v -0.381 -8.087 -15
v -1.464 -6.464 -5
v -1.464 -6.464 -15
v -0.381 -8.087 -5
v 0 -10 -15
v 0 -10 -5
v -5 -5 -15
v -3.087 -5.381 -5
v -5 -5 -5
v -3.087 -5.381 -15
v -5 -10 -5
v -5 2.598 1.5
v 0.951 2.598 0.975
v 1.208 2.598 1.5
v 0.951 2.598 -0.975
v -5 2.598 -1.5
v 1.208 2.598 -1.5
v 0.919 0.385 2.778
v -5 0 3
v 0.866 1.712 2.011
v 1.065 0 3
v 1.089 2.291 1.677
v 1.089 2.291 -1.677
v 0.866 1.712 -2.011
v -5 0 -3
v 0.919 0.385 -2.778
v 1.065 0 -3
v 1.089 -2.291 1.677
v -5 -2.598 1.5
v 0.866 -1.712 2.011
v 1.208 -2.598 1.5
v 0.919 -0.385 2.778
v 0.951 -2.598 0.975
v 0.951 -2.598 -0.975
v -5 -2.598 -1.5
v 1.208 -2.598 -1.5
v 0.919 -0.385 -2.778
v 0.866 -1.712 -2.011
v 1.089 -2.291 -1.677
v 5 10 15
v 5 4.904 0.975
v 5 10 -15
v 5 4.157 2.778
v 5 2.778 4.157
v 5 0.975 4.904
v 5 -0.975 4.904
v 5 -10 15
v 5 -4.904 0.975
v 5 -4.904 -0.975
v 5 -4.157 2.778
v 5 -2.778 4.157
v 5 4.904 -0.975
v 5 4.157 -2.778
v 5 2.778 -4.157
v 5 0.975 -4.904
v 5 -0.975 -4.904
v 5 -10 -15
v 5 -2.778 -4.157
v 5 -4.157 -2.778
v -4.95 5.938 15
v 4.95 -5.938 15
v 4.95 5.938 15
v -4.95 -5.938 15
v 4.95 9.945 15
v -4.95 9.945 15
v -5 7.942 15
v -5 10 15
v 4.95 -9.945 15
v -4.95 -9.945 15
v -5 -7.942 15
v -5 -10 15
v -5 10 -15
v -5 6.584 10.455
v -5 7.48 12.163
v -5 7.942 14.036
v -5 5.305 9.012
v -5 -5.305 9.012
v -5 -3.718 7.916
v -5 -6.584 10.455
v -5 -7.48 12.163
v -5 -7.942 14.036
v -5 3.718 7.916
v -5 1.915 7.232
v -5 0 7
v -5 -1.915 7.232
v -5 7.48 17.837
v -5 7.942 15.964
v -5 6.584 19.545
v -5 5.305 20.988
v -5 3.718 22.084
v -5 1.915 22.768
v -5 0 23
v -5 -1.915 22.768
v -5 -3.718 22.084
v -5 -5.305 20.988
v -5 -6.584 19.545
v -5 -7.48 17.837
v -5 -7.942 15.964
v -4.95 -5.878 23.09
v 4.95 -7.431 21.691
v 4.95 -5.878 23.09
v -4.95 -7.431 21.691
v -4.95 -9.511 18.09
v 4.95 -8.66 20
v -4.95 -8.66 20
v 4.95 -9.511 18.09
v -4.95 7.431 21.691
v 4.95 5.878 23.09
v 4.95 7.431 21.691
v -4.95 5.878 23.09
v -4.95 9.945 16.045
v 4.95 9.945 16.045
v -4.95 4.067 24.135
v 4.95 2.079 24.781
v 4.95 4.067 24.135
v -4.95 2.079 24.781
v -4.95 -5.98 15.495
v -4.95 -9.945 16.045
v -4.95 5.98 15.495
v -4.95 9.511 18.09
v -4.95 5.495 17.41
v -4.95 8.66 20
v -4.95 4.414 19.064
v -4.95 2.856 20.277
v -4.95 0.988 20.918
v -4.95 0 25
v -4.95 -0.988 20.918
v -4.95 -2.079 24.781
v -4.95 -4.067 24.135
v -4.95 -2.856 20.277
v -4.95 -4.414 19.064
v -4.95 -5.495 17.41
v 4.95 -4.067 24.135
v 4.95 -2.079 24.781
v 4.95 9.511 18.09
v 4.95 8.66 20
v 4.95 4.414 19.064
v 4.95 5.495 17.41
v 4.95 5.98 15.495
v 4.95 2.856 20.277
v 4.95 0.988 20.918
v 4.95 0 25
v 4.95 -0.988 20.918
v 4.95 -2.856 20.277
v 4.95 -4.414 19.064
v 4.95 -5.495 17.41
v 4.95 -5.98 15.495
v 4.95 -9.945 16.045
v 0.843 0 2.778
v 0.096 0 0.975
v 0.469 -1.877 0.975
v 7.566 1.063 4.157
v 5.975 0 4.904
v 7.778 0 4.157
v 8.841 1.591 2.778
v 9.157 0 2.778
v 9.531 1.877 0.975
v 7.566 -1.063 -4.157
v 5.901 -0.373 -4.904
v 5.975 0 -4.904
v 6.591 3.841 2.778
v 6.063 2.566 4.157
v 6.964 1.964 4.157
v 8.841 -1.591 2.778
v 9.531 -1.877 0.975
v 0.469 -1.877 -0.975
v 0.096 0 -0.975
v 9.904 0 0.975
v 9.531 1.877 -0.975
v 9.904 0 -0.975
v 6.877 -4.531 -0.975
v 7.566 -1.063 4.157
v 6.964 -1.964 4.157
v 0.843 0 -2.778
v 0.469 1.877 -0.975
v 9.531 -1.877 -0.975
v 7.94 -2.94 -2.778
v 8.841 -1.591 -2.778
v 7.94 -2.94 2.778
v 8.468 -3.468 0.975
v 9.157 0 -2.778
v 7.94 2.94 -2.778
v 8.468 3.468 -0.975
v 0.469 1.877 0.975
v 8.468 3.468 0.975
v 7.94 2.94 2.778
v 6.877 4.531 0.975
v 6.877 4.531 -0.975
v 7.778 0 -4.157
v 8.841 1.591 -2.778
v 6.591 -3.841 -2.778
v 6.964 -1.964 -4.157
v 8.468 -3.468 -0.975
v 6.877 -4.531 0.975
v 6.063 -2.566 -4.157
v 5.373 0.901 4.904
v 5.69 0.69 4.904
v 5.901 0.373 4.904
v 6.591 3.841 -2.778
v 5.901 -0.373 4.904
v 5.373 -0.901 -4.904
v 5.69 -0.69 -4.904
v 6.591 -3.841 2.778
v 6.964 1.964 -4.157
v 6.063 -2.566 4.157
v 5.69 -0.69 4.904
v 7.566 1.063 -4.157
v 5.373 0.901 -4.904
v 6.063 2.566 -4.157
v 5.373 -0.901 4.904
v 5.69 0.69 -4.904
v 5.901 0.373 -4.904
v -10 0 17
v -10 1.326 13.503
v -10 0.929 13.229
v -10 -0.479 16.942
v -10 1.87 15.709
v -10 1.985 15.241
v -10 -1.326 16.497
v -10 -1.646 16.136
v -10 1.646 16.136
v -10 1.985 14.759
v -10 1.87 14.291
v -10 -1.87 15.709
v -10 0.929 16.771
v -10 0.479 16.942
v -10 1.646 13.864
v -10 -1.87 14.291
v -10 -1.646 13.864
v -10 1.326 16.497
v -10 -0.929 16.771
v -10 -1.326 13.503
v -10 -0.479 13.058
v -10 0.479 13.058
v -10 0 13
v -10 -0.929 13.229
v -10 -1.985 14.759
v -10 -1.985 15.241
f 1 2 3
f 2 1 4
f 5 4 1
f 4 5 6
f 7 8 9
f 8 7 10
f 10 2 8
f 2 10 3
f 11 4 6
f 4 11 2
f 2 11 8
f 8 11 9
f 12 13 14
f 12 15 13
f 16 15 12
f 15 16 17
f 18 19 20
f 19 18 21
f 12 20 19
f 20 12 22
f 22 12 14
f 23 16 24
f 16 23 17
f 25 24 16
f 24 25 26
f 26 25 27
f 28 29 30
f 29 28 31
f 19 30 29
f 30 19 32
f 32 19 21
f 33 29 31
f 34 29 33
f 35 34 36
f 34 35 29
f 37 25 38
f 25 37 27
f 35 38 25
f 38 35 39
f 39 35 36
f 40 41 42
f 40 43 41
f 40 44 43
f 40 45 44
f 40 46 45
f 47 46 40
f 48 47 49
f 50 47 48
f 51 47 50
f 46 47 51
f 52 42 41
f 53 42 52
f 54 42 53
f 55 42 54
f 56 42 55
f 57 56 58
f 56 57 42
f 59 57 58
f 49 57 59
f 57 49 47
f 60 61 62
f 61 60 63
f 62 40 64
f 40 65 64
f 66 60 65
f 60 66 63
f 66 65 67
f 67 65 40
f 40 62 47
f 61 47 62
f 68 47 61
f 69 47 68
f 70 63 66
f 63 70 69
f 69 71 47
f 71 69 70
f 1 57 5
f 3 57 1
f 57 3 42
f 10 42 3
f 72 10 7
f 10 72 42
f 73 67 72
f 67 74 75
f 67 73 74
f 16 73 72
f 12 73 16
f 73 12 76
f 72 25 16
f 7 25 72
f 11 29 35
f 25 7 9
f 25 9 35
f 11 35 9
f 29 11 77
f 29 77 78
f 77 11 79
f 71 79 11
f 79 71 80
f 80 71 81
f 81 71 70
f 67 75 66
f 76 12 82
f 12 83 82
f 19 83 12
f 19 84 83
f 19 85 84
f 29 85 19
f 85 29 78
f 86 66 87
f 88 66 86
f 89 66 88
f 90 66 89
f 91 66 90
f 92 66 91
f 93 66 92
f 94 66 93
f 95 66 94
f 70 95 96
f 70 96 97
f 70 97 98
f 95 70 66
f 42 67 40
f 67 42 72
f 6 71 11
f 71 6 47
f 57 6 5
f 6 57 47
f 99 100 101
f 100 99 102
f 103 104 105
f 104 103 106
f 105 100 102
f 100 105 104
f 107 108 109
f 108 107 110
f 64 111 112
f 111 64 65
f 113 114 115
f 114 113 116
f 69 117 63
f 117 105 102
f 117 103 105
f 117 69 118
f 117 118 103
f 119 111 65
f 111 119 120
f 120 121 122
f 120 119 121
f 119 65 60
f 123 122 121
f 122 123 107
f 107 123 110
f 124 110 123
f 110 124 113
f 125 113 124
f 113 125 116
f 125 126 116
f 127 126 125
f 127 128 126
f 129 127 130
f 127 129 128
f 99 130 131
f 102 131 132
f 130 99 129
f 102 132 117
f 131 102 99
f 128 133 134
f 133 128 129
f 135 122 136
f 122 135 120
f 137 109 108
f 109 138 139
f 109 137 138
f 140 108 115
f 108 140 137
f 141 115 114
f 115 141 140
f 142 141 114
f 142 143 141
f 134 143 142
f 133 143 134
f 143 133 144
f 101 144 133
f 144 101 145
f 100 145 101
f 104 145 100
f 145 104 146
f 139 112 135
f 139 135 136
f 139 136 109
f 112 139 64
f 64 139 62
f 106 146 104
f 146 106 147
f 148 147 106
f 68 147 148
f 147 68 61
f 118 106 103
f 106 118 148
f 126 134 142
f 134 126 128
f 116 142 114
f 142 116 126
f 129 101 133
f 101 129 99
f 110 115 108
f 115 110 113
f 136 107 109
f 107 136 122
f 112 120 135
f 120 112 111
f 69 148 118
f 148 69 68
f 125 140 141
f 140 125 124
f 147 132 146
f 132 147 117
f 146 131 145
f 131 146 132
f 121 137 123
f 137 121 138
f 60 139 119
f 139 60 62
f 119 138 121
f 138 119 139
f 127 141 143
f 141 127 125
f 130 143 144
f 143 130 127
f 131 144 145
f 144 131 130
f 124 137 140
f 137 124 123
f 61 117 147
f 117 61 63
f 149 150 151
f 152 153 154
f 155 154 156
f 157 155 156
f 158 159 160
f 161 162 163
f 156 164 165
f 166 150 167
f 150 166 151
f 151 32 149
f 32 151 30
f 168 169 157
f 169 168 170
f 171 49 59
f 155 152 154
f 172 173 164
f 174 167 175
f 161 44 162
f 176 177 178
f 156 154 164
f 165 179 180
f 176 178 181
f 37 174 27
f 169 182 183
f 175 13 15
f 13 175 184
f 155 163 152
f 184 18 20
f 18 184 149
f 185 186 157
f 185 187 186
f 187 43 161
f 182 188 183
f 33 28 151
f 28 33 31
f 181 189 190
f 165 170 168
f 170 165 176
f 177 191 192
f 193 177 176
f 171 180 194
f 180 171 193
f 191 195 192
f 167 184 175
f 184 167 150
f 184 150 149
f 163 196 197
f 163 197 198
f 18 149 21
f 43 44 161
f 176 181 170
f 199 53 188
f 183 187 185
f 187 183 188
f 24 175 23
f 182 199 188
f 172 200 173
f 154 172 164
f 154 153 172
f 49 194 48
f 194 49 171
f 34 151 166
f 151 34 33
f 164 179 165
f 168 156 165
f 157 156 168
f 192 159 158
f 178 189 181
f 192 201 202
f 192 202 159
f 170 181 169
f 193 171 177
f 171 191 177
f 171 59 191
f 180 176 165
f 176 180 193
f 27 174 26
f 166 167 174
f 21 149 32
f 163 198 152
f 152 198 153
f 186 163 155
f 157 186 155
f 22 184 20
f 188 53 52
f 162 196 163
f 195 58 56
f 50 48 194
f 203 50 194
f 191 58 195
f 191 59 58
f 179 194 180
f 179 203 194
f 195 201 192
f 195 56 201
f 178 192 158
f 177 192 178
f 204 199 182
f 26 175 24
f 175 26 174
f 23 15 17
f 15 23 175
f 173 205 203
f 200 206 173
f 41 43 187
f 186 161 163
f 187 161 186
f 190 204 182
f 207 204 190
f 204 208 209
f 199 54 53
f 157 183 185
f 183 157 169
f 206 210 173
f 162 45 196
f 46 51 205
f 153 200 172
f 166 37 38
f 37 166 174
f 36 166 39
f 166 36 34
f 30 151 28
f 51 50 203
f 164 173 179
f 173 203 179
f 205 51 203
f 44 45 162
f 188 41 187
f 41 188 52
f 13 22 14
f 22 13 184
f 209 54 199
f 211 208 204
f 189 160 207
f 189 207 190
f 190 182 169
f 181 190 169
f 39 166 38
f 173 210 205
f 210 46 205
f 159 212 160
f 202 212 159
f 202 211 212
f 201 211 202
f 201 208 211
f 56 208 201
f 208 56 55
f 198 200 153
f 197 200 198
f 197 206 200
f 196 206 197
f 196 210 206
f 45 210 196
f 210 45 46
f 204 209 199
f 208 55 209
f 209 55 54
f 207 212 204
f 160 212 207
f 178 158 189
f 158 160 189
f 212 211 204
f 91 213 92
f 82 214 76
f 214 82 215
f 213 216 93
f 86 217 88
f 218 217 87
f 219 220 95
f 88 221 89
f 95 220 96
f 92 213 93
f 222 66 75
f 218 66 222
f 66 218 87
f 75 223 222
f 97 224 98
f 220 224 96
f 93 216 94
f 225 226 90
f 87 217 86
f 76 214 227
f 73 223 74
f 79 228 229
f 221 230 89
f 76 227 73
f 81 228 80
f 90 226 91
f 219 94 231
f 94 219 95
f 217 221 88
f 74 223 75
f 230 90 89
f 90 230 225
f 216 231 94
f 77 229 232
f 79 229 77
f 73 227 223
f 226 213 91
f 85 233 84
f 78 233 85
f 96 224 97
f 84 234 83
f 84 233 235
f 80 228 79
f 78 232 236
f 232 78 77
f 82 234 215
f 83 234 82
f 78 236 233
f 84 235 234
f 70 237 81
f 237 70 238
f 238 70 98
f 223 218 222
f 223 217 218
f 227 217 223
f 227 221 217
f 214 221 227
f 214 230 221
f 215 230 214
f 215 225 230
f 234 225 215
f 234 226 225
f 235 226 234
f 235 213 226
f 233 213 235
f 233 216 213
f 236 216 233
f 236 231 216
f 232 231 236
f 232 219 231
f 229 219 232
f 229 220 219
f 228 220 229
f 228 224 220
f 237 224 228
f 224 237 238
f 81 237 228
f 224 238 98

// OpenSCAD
use <povray.scad>

pov_init();
openscad_background();
openscad_camera(type="perspective", distance=300, width= 16, heigth= 9);
openscad_light_source();


_translate([-5,-10,-15]) 
_union()
{
  _color([1,0.5,0.5]) _difference()
  {
    _cube(size=[10,20,30]);
    _cylinder(r=5,h=20,center=true);
    _translate([5,10,15]) _rotate([0,90,0]) _cylinder(r=3,h=11,$fn=6,center=true);
  }
  _translate ([10,10,15]) _color ([0.5,0.5,1]) _sphere(r=5);
  _translate([0.05,10,30]) _rotate([0,90,0]) _color([0.2,1,.2,.8]) 
  _difference()
  {
    _cylinder(r=10,h=9.9);
    _translate([0,0,-0.5]) _cylinder(r=6,h=11);
  }
  _translate([0,10,30]) _rotate([0,-90,0]) _color([1,0,1,0.2]) _cylinder(r1=8,r2=2,h=5);
}
